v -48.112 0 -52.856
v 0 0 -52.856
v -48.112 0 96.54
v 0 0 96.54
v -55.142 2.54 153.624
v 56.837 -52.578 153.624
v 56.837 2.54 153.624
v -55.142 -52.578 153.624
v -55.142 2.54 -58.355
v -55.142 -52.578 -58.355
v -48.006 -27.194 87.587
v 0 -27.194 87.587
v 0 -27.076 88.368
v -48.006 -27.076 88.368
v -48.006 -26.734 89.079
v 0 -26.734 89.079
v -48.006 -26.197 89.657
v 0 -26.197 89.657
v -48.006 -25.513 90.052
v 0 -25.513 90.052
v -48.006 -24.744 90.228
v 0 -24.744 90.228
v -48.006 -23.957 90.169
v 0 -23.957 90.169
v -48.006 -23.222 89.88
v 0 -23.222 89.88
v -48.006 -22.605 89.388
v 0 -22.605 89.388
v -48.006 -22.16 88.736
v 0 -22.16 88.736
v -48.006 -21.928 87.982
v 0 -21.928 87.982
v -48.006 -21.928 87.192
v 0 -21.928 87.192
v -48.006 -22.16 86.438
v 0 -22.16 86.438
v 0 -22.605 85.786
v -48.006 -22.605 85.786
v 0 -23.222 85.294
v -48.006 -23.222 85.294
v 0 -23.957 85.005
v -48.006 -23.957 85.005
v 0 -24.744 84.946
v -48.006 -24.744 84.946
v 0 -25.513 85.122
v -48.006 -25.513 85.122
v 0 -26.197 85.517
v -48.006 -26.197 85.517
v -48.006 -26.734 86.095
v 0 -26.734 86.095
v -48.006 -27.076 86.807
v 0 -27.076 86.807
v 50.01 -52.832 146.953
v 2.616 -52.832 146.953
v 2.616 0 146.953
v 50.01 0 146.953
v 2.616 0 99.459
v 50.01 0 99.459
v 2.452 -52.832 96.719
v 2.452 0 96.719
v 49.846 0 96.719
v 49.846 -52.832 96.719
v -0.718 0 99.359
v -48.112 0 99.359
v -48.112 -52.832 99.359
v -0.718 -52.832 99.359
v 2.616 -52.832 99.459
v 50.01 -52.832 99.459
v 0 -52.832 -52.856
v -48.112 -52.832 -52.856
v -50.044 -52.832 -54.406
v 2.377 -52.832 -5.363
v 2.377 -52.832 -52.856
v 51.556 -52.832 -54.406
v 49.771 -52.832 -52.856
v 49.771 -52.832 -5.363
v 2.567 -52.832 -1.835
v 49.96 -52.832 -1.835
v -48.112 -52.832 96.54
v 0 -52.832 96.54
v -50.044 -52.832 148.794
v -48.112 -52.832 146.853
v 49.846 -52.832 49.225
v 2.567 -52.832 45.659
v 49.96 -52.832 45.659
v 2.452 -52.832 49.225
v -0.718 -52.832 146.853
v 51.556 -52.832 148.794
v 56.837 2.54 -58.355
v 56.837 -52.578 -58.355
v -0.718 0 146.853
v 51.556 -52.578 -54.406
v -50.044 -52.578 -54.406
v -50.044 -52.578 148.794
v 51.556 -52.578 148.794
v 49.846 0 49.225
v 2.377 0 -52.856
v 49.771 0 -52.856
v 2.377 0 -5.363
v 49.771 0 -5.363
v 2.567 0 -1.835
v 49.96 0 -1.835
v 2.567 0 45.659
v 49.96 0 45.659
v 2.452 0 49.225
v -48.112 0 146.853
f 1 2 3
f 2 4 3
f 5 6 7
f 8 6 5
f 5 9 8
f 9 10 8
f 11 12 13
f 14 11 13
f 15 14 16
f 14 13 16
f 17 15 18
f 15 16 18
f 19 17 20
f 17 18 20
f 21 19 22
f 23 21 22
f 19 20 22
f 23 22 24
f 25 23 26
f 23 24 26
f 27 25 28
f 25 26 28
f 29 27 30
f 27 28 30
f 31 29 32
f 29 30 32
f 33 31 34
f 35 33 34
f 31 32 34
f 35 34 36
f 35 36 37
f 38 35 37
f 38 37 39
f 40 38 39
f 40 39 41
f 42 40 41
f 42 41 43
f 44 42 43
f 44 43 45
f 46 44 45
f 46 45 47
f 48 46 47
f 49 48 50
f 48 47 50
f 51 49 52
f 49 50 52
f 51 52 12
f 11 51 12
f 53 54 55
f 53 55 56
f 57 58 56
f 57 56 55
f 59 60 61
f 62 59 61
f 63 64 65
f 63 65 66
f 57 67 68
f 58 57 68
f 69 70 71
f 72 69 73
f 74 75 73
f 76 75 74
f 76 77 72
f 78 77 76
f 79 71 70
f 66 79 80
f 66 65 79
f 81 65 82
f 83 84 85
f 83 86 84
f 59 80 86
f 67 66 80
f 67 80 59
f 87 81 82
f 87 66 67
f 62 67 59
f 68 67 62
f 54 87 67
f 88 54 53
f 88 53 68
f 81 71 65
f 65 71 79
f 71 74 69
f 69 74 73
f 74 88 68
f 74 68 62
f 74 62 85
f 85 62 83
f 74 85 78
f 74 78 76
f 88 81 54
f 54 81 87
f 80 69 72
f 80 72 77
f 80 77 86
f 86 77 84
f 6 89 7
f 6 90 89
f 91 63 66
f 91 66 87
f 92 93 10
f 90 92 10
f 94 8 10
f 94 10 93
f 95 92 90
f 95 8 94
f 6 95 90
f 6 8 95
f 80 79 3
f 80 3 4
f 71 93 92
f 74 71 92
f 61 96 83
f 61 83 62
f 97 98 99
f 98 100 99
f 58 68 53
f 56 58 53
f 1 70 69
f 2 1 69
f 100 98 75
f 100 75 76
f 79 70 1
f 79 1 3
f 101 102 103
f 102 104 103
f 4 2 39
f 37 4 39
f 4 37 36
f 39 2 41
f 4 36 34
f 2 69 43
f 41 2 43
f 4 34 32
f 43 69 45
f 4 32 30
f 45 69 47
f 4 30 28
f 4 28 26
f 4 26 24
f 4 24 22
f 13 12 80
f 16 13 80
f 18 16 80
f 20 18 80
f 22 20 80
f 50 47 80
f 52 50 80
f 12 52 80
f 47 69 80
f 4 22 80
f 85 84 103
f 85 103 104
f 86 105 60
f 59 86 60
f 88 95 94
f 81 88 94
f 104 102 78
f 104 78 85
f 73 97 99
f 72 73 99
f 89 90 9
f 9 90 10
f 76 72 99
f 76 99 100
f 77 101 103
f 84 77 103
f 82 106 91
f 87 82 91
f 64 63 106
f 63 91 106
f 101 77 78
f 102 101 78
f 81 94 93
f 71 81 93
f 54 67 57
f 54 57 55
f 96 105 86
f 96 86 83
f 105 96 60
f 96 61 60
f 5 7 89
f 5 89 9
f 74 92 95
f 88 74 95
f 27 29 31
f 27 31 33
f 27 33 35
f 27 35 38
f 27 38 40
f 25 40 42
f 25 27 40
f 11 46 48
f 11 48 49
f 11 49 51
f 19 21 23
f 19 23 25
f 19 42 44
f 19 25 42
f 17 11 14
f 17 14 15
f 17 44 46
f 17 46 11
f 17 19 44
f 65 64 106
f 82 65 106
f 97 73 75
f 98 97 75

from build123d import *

# Parameters (mm, degrees)
F0_W     = 111.9791269302
F0_H     = 211.9790837169
F1_DEPTH = 52.578
F0_W_2   = 50.8
F0_H_2   = 50.8
F0_W_3   = 47.3935049959
F0_H_3   = 47.4935397506
F2_DEPTH = 52.832
F3_W     = 48.1118559837
F3_H     = 149.3962490931
F4_DEPTH = 53.594
F5_W     = 111.9791269302
F5_H     = 211.9790837169
F6_DEPTH = 2.54
F7_R     = 2.6479987439
F8_DEPTH = 48.006


with BuildPart() as f1:
    # F0 (on Front) → F1 (new body)
    with BuildSketch(Plane.XZ):
        with Locations((0.8473545313, 47.6342774928)):
            Rectangle(F0_W, F0_H)
        Polygon((-50.0439400733, 97.9935325928), (-50.0439400733, 148.7935325928), (0.7560599267, 148.7935325928), (51.5560599267, 148.7935325928), (51.5560599267, 97.9935325928), (51.5560599267, 47.1935325928), (51.5560599267, -3.6064674072), (51.5560599267, -54.4064674072), (0.7560599267, -54.4064674072), (-50.0439400733, -54.4064674072), align=None, mode=Mode.SUBTRACT)
    extrude(amount=F1_DEPTH)

    # F0 (on Front) → F2 (join)
    with BuildSketch(Plane.XZ):
        with Locations((-24.6439400733, 123.3935325928)):
            Rectangle(F0_W_2, F0_H_2)
        with Locations((-24.4151034858, 123.106200248)):
            Rectangle(F0_W_3, F0_H_3, mode=Mode.SUBTRACT)
        with Locations((26.1560599267, 123.3935325928)):
            Rectangle(F0_W_2, F0_H_2)
        with Locations((26.312828064, 123.2058629394)):
            Rectangle(F0_W_3, F0_H_3, mode=Mode.SUBTRACT)
        with Locations((26.1560599267, 72.5935325928)):
            Rectangle(F0_W_2, F0_H_2)
        with Locations((26.148814708, 72.9721300304)):
            Rectangle(F0_W_3, F0_H_3, mode=Mode.SUBTRACT)
        Polygon((0.7560599267, 97.9935325928), (-50.0439400733, 97.9935325928), (-50.0439400733, -54.4064674072), (0.7560599267, -54.4064674072), (0.7560599267, -3.6064674072), (0.7560599267, 47.1935325928), align=None)
        with Locations((26.1560599267, 21.7935325928)):
            Rectangle(F0_W_2, F0_H_2)
        with Locations((26.2633450329, 21.912215976)):
            Rectangle(F0_W_3, F0_H_3, mode=Mode.SUBTRACT)
        with Locations((26.1560599267, -29.0064674072)):
            Rectangle(F0_W_2, F0_H_2)
        with Locations((26.0739140213, -29.1093634441)):
            Rectangle(F0_W_3, F0_H_3, mode=Mode.SUBTRACT)
    extrude(amount=F2_DEPTH)

    # F3 (on face) → F4 (cut)
    with BuildSketch(Plane.XZ.offset(52.832)):
        with Locations((-24.0559279919, 21.8419912271)):
            Rectangle(F3_W, F3_H)
    extrude(amount=-F4_DEPTH, mode=Mode.SUBTRACT)

    # F5 (on face) → F6 (join)
    with BuildSketch(Plane(origin=(0, 0, 0), x_dir=(-1, 0, 0), z_dir=(0, 1, 0))):
        with Locations((-0.8473545313, 47.6342774928)):
            Rectangle(F5_W, F5_H)
    extrude(amount=F6_DEPTH)

    # F7 (on face) → F8 (join)
    with BuildSketch(Plane(origin=(0, 0, 0), x_dir=(0, -1, 0), z_dir=(-1, 0, 0))):
        with Locations((24.5460756123, 87.587043643)):
            Circle(F7_R)
    extrude(amount=F8_DEPTH)


solid = f1.part
